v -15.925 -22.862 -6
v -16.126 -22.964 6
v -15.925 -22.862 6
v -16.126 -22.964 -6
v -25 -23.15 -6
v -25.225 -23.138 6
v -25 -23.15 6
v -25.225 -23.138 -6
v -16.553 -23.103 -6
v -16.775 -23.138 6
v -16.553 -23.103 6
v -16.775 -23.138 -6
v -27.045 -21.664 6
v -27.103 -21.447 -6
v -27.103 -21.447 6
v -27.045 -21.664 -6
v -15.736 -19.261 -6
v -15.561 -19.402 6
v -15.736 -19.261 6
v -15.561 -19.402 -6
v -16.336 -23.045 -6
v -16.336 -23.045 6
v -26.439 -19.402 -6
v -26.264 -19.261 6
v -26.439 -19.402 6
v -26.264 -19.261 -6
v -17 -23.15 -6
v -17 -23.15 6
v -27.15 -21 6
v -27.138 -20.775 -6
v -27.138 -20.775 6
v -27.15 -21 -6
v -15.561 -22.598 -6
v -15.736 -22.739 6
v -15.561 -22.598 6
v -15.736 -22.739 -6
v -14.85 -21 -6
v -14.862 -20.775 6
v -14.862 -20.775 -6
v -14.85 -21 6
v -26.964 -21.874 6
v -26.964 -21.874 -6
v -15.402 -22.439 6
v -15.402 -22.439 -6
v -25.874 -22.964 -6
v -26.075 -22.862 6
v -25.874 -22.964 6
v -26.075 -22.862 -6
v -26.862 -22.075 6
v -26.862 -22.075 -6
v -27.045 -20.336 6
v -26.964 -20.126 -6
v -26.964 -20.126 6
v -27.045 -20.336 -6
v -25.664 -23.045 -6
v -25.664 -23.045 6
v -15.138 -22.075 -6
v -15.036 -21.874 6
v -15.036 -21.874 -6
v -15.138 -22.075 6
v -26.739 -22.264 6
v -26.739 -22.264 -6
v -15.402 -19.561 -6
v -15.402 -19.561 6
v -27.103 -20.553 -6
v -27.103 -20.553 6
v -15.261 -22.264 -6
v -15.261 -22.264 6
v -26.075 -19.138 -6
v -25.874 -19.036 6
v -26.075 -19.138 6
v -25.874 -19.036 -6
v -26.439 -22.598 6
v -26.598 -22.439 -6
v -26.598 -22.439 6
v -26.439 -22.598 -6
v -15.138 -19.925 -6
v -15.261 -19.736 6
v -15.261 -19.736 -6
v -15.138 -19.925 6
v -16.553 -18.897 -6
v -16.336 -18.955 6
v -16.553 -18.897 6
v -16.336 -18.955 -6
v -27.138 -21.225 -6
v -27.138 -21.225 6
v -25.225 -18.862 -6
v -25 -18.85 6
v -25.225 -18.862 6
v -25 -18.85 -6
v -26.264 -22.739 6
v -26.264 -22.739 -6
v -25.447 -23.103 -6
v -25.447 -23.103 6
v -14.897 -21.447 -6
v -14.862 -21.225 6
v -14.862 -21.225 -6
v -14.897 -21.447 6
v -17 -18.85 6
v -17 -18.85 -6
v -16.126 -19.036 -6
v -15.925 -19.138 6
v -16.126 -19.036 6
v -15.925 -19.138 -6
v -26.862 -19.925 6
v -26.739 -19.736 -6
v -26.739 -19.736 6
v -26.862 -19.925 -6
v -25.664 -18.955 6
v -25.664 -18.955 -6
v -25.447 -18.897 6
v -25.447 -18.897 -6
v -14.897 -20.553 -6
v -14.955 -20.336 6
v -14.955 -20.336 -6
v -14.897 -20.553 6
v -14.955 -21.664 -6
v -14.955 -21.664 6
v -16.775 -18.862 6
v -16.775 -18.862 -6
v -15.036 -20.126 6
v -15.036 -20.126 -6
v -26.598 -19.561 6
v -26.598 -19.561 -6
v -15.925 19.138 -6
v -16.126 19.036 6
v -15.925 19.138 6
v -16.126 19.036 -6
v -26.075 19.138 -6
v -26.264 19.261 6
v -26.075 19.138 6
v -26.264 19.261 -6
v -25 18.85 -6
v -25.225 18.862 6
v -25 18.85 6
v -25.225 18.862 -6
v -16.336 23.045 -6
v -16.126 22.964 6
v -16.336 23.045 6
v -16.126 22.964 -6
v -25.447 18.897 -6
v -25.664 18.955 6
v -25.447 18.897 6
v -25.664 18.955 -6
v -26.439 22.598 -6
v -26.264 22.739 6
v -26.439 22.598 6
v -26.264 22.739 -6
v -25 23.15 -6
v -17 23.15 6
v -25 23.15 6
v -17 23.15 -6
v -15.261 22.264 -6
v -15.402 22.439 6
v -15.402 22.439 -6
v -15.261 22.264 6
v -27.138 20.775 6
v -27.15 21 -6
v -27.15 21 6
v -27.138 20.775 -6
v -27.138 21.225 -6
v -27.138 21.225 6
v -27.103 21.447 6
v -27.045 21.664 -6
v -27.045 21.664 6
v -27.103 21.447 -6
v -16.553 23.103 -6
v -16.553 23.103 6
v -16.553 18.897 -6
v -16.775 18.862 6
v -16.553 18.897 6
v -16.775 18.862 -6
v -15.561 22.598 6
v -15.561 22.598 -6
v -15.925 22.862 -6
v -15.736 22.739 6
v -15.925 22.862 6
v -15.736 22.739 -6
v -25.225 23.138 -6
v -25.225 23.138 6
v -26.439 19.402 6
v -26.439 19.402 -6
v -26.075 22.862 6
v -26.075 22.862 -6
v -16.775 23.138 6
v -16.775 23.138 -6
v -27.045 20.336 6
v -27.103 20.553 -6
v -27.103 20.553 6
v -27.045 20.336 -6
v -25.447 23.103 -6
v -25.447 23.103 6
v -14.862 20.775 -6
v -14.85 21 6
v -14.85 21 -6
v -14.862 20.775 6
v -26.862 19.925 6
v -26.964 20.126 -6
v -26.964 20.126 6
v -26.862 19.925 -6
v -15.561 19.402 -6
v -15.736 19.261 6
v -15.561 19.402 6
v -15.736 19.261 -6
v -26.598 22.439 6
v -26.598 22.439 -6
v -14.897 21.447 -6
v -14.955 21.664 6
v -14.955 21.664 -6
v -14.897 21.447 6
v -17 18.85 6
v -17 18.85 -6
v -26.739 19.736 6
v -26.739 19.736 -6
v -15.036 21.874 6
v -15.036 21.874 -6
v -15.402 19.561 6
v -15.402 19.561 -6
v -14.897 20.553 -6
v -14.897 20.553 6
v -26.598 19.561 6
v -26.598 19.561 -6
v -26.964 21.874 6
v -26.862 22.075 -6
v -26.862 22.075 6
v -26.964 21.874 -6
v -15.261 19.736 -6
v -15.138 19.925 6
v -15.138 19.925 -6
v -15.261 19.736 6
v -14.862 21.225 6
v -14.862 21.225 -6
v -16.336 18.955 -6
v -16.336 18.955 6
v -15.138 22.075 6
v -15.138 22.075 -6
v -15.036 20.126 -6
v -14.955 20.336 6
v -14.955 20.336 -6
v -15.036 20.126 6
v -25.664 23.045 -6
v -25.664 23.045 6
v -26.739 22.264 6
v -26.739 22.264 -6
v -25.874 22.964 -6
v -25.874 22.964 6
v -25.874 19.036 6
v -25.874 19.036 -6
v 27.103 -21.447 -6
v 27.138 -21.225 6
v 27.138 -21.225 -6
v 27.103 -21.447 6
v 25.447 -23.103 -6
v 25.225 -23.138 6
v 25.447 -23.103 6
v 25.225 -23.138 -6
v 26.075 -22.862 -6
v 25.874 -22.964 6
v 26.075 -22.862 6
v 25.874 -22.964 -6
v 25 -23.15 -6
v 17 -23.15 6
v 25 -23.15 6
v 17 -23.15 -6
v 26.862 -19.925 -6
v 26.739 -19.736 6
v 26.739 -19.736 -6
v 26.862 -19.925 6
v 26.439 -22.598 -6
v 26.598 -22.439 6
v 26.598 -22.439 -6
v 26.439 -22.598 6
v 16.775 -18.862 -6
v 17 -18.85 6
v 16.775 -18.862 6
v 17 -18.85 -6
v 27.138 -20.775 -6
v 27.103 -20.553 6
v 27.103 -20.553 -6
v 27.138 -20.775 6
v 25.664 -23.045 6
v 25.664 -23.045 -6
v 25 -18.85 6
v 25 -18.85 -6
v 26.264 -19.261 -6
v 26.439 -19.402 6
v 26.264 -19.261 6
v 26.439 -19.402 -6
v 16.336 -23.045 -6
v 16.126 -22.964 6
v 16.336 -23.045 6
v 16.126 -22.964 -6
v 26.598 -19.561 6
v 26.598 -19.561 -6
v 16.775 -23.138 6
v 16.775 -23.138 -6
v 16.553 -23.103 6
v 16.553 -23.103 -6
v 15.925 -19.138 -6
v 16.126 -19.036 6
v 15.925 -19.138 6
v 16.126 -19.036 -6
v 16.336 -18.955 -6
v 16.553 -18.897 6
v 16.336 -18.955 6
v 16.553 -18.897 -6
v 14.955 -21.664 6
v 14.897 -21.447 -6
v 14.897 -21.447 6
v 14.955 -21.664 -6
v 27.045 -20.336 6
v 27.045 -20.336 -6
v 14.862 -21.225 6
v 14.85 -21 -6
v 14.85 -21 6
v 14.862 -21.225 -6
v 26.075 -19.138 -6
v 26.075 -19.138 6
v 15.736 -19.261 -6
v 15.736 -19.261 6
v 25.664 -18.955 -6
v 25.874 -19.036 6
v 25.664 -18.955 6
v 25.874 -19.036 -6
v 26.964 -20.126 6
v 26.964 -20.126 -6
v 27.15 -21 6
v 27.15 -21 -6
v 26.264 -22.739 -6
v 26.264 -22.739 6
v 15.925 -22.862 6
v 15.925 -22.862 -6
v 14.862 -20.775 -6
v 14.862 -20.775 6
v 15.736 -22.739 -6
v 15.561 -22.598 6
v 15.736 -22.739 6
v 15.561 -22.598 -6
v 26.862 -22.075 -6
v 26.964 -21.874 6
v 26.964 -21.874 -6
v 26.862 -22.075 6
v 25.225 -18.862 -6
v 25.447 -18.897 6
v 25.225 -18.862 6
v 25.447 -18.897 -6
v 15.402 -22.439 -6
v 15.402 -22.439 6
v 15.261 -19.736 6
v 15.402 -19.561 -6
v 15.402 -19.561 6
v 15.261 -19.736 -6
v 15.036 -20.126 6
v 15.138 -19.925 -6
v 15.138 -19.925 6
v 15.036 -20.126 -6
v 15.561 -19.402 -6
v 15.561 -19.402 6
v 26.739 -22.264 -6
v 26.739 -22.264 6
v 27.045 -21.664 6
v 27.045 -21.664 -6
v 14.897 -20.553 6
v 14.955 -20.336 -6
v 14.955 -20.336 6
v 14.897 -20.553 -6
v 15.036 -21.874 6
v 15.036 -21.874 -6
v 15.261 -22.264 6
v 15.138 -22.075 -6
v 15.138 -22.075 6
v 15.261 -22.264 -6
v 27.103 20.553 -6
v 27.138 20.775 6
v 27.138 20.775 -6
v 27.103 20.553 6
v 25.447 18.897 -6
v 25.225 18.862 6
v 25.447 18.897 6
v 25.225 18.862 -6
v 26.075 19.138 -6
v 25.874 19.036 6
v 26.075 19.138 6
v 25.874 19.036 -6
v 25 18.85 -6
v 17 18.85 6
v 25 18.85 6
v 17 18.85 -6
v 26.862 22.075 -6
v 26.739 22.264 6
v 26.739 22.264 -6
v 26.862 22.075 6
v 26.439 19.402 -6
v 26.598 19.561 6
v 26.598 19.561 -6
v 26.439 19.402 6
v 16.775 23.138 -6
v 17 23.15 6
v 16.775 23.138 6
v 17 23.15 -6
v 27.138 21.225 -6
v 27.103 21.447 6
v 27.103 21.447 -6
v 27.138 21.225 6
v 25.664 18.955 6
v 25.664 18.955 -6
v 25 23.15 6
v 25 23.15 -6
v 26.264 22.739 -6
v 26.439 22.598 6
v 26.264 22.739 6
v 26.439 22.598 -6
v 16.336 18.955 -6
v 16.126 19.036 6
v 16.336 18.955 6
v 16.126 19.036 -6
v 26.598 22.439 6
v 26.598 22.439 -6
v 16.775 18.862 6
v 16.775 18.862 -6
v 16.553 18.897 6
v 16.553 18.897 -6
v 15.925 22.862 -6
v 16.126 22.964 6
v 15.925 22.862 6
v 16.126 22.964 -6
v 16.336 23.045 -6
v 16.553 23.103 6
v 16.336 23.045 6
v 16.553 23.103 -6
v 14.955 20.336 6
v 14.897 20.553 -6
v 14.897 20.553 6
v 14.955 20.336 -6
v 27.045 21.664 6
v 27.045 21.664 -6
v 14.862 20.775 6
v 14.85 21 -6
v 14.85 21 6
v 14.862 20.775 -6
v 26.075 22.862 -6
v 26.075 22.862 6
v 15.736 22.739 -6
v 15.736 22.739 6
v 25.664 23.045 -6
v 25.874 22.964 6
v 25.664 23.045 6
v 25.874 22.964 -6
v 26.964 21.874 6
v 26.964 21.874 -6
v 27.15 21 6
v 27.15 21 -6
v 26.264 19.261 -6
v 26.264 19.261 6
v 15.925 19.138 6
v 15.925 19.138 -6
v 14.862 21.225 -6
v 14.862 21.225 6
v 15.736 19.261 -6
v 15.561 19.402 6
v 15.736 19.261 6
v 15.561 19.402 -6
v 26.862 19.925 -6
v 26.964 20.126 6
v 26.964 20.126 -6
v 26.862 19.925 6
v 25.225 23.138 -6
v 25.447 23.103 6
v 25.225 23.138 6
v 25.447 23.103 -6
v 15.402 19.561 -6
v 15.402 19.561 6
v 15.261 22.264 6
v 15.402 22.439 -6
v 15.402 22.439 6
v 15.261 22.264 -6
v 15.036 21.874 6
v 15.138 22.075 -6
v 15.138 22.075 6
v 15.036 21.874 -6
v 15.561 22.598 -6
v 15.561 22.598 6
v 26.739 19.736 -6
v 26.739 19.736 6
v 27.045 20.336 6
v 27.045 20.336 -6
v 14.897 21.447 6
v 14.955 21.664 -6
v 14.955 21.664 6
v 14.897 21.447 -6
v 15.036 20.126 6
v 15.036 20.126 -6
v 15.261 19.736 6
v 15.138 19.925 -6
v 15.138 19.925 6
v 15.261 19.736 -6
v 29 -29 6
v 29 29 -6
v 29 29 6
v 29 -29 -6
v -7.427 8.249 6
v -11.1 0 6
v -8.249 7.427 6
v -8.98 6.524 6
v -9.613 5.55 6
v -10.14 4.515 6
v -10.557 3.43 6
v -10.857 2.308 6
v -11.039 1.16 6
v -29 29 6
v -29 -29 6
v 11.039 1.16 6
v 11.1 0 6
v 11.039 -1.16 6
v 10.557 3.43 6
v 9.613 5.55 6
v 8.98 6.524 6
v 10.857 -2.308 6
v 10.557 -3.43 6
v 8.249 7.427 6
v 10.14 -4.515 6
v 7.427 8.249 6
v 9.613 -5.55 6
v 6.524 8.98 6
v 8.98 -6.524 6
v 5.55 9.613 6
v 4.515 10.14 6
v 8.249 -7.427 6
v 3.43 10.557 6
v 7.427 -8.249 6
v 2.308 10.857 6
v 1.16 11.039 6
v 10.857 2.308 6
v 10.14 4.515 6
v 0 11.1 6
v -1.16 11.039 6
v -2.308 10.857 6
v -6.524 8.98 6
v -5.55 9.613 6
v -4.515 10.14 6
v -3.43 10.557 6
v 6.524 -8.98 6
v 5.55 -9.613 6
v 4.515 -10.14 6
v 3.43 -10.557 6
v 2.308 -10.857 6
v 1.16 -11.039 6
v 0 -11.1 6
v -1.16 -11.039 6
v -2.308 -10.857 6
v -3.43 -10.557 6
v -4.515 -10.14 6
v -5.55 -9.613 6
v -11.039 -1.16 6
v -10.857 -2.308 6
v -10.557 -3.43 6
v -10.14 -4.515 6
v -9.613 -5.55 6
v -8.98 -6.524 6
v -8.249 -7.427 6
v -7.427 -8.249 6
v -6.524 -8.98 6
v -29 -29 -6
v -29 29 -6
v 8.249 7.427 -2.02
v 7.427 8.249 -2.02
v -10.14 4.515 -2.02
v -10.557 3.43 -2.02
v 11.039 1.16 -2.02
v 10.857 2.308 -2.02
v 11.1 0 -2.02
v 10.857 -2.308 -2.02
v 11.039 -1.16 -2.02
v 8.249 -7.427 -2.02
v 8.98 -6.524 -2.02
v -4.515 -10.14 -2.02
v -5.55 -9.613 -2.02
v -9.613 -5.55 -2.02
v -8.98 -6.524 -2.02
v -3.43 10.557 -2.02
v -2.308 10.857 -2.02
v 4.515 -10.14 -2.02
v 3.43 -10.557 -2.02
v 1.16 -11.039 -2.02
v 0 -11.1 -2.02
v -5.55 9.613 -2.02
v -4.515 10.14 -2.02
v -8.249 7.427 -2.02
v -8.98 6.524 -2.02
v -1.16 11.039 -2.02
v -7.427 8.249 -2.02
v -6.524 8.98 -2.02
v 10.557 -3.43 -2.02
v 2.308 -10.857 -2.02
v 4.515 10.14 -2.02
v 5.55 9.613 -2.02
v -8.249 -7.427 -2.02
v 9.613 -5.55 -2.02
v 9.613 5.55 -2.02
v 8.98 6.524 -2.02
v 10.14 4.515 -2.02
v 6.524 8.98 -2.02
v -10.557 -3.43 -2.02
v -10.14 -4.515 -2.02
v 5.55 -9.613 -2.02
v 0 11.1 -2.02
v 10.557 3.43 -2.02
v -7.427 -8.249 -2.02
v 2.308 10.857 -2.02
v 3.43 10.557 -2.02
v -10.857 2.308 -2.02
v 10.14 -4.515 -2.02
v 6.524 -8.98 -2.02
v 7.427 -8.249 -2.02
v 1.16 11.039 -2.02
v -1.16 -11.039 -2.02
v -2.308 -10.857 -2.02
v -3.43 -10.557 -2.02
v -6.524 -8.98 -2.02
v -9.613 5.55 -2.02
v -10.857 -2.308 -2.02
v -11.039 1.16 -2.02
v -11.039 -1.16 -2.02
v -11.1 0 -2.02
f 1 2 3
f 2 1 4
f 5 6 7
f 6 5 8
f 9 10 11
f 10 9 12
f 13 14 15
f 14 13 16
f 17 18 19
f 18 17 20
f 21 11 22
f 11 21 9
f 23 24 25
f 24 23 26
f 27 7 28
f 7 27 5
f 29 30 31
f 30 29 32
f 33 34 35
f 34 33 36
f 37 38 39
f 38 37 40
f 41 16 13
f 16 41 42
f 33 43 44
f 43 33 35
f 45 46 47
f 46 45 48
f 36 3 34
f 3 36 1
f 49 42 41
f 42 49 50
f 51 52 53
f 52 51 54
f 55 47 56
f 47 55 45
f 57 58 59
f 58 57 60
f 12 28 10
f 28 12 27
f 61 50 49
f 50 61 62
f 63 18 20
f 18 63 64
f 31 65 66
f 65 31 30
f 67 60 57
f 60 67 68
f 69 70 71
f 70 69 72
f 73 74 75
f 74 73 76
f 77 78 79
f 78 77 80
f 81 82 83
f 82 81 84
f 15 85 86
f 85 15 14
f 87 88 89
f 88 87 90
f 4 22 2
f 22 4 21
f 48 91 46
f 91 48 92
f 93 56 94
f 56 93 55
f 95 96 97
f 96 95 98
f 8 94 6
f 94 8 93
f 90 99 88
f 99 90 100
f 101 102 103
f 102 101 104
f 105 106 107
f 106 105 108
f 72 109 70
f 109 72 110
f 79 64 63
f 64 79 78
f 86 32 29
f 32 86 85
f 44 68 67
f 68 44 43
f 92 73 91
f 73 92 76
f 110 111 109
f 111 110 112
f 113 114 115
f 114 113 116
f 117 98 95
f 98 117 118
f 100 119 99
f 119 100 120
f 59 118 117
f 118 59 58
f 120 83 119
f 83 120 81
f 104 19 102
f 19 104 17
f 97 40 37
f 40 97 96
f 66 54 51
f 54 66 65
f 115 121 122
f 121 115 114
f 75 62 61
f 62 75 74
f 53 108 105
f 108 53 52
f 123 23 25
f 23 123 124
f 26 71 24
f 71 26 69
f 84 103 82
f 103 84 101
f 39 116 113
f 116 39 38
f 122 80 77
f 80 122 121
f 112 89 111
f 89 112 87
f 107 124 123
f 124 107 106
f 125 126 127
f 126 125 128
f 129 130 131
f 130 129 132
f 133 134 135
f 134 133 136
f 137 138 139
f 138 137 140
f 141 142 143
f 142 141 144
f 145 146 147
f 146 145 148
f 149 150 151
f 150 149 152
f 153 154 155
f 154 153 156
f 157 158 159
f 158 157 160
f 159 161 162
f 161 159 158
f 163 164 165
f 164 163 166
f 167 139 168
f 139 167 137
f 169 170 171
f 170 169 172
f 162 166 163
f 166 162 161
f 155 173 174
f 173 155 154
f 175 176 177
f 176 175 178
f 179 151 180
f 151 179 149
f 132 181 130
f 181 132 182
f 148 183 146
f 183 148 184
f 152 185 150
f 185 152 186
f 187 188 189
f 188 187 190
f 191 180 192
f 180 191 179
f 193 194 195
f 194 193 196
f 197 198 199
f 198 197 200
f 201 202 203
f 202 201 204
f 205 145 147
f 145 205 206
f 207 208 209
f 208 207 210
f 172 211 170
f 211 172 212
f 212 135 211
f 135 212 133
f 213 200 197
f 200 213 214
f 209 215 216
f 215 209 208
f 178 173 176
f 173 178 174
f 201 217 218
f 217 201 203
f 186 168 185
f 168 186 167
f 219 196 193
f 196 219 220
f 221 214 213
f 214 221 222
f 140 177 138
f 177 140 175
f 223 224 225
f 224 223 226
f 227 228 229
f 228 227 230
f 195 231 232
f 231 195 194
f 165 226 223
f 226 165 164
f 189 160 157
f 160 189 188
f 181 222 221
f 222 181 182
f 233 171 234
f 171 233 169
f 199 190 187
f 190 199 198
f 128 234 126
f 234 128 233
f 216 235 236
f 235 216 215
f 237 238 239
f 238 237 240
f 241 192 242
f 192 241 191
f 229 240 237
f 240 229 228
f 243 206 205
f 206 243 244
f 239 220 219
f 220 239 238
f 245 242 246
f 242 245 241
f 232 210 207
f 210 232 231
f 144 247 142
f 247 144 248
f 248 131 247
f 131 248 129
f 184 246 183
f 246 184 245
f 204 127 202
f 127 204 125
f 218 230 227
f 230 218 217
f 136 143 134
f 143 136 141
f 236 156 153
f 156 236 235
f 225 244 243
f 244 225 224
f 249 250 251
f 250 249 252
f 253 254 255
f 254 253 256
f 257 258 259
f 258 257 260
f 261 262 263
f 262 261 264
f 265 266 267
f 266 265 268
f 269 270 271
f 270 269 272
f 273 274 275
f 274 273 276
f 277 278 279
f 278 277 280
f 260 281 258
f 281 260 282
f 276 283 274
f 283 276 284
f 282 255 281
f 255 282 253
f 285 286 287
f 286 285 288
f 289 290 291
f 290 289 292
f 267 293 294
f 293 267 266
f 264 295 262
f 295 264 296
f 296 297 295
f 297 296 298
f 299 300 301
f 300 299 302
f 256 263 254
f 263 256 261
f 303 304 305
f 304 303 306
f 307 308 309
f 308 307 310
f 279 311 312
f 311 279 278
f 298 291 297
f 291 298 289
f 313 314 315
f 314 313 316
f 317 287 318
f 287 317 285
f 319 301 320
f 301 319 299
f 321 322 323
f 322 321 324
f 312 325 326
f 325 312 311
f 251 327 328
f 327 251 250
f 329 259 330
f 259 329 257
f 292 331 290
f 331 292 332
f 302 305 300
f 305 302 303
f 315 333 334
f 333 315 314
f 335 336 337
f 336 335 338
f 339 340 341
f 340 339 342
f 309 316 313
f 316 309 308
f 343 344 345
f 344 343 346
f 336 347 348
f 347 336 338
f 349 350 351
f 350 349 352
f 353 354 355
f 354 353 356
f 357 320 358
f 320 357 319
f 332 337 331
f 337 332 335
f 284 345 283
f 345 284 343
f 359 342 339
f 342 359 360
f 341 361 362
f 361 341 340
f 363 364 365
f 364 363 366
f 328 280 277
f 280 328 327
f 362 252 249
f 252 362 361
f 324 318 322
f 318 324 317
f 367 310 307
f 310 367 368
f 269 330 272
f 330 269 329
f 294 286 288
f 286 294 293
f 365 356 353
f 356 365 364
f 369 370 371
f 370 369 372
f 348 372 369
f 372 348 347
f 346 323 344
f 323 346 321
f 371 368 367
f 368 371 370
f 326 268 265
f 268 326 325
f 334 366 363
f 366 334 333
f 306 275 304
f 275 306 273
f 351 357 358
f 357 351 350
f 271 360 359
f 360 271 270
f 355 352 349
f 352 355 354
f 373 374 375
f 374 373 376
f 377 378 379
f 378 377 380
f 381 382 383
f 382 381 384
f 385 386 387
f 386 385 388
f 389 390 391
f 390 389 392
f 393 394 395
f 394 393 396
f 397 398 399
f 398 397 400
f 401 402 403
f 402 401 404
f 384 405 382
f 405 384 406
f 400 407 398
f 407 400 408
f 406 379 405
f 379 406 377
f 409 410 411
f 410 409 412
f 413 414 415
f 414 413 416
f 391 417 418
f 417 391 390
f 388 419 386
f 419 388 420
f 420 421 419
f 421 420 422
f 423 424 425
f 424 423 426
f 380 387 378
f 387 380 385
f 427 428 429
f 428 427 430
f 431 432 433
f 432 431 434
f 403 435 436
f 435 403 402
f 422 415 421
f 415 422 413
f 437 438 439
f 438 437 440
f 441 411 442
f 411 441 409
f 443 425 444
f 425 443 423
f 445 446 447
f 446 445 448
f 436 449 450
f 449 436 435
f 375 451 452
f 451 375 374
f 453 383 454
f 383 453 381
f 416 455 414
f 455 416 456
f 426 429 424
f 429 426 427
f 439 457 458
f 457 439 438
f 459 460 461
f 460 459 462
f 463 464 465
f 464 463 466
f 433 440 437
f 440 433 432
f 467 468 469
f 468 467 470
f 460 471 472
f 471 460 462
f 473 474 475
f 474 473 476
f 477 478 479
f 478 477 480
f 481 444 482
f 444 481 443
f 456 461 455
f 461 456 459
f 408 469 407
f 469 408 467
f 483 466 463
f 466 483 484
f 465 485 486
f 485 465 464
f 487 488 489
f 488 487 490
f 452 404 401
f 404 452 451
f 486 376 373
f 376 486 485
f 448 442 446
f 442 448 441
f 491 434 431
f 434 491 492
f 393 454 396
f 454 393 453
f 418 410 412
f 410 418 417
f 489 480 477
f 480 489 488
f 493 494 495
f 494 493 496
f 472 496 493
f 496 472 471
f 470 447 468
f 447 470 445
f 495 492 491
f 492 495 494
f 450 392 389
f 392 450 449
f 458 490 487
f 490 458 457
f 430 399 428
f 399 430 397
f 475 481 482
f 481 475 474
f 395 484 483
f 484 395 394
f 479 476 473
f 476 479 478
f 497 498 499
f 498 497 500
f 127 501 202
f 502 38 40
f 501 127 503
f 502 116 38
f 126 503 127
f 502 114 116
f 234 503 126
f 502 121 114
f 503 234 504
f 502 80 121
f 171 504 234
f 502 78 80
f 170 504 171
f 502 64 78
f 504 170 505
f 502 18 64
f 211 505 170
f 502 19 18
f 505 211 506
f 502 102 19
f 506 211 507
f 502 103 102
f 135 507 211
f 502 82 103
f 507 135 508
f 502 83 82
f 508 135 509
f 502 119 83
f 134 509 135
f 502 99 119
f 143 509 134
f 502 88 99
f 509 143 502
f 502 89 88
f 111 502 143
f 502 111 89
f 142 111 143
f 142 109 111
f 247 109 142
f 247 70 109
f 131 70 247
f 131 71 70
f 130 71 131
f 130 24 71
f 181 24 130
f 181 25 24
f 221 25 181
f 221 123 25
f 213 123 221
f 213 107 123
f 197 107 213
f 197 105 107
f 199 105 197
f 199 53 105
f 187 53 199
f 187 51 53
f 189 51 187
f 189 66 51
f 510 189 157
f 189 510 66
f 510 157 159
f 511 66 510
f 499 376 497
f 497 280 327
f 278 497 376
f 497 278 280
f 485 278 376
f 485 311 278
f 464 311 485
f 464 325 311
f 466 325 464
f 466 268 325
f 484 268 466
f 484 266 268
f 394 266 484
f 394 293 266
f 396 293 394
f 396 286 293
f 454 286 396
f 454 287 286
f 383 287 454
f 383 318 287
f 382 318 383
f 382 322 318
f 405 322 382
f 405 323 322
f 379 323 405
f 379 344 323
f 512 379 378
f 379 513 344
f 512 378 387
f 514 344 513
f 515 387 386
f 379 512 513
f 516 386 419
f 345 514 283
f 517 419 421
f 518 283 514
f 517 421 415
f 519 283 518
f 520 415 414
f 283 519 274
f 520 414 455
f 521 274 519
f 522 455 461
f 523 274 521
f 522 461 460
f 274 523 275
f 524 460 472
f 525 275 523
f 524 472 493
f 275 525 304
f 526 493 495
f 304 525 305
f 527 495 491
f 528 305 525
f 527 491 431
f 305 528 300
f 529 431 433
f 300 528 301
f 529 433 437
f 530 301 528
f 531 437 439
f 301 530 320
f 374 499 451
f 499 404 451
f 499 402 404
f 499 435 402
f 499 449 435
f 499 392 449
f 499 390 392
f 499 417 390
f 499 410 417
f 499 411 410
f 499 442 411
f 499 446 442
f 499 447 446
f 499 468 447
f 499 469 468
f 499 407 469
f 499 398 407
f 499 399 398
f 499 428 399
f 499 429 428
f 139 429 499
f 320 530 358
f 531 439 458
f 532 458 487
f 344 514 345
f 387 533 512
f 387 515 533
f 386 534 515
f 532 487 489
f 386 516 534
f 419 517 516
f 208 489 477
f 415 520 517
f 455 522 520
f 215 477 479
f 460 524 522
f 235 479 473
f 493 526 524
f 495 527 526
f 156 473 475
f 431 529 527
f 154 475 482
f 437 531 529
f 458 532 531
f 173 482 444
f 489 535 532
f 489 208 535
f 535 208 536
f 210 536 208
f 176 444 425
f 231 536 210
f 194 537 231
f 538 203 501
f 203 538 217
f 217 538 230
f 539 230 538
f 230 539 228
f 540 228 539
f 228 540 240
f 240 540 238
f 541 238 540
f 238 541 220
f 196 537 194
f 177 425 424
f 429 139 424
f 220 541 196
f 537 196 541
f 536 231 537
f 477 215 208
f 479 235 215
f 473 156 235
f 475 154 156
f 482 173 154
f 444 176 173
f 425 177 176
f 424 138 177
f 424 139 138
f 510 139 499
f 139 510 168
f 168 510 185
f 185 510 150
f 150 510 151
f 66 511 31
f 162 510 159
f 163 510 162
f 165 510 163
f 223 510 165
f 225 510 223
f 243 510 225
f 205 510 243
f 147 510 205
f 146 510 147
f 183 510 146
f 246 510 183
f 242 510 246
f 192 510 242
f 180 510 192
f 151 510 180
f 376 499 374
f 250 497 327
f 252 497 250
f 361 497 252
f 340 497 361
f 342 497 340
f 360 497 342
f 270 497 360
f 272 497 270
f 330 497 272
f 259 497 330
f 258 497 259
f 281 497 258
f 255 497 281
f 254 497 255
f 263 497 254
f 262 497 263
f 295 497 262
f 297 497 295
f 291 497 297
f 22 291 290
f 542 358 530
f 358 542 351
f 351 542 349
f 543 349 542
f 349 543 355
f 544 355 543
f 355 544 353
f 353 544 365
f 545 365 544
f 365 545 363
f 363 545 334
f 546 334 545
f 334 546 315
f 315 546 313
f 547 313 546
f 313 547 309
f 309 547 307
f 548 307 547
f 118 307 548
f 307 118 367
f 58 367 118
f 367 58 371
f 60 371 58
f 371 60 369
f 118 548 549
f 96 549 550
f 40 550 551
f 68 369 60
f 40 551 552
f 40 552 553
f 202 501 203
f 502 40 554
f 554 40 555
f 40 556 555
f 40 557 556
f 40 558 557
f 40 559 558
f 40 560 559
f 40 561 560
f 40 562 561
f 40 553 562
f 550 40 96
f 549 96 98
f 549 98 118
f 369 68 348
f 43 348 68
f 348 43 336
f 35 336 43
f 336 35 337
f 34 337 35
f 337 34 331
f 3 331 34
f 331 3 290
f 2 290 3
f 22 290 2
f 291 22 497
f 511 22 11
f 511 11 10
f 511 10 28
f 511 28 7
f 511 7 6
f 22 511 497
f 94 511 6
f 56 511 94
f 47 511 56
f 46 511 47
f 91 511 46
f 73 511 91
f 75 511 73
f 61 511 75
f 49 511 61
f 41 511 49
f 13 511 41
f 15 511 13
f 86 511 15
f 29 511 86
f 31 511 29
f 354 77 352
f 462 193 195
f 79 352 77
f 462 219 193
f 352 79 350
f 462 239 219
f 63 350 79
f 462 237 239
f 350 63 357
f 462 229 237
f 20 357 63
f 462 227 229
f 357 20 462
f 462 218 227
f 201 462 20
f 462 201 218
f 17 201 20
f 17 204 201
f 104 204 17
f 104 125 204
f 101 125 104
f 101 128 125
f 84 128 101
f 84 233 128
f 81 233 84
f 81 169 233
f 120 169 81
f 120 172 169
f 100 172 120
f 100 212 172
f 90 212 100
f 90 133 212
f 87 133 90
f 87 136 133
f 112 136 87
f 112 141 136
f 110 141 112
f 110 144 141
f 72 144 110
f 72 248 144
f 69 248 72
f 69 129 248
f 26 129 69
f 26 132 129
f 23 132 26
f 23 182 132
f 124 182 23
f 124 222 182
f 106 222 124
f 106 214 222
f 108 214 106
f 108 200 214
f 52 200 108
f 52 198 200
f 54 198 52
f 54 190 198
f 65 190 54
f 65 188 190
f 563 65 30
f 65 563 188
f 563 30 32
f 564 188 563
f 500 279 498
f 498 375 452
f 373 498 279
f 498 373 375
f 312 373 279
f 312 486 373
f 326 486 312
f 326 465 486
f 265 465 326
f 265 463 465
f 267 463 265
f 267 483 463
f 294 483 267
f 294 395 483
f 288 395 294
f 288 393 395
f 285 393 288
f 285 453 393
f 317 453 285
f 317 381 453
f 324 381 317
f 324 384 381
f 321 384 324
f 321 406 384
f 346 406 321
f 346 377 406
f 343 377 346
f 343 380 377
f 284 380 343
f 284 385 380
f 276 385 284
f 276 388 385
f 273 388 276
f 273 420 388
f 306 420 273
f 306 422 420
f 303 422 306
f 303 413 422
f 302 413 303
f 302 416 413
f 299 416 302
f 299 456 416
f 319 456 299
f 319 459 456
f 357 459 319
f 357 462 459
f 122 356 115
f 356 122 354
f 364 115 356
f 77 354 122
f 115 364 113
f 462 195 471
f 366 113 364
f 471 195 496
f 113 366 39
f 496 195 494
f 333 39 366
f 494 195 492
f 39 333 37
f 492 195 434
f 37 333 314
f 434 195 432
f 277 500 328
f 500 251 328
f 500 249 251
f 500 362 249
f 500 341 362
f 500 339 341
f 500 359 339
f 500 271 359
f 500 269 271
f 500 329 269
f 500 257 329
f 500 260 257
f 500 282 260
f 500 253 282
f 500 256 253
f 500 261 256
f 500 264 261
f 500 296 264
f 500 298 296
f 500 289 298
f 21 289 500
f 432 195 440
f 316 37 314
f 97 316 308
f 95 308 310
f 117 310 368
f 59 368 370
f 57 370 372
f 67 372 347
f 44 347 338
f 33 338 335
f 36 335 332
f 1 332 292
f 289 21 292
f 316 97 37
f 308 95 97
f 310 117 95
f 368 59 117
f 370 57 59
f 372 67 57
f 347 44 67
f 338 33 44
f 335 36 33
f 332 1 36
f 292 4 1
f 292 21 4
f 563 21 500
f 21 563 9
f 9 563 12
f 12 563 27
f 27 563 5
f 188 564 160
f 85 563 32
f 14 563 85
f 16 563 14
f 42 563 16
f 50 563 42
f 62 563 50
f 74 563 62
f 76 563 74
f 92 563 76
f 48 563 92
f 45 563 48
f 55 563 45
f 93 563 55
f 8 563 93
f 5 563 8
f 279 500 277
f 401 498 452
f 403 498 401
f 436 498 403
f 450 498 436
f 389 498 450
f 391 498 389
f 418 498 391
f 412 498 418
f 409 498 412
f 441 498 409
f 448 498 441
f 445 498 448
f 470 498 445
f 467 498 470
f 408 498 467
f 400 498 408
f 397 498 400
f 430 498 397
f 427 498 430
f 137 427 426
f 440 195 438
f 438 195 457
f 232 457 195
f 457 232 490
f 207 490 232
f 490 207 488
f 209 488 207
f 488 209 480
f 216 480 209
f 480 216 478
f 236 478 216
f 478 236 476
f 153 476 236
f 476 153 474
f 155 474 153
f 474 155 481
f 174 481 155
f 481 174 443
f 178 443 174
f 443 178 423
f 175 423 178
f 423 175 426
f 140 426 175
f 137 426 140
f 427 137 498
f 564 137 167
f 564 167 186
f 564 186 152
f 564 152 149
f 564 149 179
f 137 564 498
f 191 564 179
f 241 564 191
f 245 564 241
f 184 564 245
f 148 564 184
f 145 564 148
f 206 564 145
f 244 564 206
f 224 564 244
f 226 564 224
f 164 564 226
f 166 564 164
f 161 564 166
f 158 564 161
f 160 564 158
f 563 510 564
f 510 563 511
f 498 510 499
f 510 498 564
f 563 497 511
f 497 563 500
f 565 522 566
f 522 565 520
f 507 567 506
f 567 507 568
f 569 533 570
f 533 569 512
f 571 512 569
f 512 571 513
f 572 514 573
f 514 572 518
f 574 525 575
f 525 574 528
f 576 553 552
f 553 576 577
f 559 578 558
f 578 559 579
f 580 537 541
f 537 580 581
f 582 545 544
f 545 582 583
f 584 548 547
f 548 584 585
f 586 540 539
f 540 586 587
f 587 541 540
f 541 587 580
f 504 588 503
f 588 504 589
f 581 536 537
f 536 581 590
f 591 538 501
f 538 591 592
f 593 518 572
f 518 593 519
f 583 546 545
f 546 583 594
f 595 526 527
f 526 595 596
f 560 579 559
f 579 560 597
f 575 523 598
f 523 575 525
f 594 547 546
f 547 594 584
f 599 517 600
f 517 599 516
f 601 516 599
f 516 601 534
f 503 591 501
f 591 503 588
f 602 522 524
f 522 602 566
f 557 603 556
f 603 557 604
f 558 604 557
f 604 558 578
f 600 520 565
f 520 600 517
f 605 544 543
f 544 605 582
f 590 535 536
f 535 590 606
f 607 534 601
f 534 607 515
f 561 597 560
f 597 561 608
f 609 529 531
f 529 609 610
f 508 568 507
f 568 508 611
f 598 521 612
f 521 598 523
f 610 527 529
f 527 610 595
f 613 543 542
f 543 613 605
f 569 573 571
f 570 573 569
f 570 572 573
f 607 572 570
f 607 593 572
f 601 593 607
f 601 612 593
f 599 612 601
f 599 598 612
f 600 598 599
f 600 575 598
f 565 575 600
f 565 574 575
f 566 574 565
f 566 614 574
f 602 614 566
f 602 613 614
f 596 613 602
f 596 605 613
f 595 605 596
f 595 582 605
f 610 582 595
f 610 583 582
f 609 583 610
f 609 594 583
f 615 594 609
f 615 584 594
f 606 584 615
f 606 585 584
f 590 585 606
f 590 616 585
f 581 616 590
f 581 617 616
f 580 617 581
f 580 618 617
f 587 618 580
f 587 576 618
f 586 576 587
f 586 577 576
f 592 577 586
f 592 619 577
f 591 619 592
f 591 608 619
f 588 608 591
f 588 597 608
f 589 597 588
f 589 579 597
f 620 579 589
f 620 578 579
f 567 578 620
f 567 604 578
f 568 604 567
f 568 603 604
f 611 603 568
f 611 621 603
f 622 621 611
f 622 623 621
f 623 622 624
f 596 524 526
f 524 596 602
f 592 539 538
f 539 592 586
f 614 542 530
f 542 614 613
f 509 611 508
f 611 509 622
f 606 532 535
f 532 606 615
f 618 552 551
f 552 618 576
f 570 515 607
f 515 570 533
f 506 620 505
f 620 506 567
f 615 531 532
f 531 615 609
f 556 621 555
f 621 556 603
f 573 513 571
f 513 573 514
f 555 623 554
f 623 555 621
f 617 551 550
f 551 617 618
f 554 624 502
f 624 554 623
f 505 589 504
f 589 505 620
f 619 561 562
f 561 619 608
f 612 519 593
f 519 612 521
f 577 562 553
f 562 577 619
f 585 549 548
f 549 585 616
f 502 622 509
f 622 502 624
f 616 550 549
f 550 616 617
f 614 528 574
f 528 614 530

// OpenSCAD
// 608 bearing mounting plate: flanged bearing pocket with a solid bottom web.
$fn = 60;
eps = 0.02;
plate_w = 58;
plate_h = 58;
plate_t = 12;
bearing_d = 22.2;
pocket_depth = 8;
mount_pitch = 42;
mount_d = 4.3;

module slot(x, y) {
    hull() {
        translate([x - 4, y, -plate_t / 2 - eps]) cylinder(d = mount_d, h = plate_t + 2 * eps);
        translate([x + 4, y, -plate_t / 2 - eps]) cylinder(d = mount_d, h = plate_t + 2 * eps);
    }
}

difference() {
    cube([plate_w, plate_h, plate_t], center = true);
    translate([0, 0, plate_t / 2 - pocket_depth - eps])
        cylinder(d = bearing_d, h = pocket_depth + 2 * eps);
    for (x = [-mount_pitch / 2, mount_pitch / 2], y = [-mount_pitch / 2, mount_pitch / 2]) slot(x, y);
}
